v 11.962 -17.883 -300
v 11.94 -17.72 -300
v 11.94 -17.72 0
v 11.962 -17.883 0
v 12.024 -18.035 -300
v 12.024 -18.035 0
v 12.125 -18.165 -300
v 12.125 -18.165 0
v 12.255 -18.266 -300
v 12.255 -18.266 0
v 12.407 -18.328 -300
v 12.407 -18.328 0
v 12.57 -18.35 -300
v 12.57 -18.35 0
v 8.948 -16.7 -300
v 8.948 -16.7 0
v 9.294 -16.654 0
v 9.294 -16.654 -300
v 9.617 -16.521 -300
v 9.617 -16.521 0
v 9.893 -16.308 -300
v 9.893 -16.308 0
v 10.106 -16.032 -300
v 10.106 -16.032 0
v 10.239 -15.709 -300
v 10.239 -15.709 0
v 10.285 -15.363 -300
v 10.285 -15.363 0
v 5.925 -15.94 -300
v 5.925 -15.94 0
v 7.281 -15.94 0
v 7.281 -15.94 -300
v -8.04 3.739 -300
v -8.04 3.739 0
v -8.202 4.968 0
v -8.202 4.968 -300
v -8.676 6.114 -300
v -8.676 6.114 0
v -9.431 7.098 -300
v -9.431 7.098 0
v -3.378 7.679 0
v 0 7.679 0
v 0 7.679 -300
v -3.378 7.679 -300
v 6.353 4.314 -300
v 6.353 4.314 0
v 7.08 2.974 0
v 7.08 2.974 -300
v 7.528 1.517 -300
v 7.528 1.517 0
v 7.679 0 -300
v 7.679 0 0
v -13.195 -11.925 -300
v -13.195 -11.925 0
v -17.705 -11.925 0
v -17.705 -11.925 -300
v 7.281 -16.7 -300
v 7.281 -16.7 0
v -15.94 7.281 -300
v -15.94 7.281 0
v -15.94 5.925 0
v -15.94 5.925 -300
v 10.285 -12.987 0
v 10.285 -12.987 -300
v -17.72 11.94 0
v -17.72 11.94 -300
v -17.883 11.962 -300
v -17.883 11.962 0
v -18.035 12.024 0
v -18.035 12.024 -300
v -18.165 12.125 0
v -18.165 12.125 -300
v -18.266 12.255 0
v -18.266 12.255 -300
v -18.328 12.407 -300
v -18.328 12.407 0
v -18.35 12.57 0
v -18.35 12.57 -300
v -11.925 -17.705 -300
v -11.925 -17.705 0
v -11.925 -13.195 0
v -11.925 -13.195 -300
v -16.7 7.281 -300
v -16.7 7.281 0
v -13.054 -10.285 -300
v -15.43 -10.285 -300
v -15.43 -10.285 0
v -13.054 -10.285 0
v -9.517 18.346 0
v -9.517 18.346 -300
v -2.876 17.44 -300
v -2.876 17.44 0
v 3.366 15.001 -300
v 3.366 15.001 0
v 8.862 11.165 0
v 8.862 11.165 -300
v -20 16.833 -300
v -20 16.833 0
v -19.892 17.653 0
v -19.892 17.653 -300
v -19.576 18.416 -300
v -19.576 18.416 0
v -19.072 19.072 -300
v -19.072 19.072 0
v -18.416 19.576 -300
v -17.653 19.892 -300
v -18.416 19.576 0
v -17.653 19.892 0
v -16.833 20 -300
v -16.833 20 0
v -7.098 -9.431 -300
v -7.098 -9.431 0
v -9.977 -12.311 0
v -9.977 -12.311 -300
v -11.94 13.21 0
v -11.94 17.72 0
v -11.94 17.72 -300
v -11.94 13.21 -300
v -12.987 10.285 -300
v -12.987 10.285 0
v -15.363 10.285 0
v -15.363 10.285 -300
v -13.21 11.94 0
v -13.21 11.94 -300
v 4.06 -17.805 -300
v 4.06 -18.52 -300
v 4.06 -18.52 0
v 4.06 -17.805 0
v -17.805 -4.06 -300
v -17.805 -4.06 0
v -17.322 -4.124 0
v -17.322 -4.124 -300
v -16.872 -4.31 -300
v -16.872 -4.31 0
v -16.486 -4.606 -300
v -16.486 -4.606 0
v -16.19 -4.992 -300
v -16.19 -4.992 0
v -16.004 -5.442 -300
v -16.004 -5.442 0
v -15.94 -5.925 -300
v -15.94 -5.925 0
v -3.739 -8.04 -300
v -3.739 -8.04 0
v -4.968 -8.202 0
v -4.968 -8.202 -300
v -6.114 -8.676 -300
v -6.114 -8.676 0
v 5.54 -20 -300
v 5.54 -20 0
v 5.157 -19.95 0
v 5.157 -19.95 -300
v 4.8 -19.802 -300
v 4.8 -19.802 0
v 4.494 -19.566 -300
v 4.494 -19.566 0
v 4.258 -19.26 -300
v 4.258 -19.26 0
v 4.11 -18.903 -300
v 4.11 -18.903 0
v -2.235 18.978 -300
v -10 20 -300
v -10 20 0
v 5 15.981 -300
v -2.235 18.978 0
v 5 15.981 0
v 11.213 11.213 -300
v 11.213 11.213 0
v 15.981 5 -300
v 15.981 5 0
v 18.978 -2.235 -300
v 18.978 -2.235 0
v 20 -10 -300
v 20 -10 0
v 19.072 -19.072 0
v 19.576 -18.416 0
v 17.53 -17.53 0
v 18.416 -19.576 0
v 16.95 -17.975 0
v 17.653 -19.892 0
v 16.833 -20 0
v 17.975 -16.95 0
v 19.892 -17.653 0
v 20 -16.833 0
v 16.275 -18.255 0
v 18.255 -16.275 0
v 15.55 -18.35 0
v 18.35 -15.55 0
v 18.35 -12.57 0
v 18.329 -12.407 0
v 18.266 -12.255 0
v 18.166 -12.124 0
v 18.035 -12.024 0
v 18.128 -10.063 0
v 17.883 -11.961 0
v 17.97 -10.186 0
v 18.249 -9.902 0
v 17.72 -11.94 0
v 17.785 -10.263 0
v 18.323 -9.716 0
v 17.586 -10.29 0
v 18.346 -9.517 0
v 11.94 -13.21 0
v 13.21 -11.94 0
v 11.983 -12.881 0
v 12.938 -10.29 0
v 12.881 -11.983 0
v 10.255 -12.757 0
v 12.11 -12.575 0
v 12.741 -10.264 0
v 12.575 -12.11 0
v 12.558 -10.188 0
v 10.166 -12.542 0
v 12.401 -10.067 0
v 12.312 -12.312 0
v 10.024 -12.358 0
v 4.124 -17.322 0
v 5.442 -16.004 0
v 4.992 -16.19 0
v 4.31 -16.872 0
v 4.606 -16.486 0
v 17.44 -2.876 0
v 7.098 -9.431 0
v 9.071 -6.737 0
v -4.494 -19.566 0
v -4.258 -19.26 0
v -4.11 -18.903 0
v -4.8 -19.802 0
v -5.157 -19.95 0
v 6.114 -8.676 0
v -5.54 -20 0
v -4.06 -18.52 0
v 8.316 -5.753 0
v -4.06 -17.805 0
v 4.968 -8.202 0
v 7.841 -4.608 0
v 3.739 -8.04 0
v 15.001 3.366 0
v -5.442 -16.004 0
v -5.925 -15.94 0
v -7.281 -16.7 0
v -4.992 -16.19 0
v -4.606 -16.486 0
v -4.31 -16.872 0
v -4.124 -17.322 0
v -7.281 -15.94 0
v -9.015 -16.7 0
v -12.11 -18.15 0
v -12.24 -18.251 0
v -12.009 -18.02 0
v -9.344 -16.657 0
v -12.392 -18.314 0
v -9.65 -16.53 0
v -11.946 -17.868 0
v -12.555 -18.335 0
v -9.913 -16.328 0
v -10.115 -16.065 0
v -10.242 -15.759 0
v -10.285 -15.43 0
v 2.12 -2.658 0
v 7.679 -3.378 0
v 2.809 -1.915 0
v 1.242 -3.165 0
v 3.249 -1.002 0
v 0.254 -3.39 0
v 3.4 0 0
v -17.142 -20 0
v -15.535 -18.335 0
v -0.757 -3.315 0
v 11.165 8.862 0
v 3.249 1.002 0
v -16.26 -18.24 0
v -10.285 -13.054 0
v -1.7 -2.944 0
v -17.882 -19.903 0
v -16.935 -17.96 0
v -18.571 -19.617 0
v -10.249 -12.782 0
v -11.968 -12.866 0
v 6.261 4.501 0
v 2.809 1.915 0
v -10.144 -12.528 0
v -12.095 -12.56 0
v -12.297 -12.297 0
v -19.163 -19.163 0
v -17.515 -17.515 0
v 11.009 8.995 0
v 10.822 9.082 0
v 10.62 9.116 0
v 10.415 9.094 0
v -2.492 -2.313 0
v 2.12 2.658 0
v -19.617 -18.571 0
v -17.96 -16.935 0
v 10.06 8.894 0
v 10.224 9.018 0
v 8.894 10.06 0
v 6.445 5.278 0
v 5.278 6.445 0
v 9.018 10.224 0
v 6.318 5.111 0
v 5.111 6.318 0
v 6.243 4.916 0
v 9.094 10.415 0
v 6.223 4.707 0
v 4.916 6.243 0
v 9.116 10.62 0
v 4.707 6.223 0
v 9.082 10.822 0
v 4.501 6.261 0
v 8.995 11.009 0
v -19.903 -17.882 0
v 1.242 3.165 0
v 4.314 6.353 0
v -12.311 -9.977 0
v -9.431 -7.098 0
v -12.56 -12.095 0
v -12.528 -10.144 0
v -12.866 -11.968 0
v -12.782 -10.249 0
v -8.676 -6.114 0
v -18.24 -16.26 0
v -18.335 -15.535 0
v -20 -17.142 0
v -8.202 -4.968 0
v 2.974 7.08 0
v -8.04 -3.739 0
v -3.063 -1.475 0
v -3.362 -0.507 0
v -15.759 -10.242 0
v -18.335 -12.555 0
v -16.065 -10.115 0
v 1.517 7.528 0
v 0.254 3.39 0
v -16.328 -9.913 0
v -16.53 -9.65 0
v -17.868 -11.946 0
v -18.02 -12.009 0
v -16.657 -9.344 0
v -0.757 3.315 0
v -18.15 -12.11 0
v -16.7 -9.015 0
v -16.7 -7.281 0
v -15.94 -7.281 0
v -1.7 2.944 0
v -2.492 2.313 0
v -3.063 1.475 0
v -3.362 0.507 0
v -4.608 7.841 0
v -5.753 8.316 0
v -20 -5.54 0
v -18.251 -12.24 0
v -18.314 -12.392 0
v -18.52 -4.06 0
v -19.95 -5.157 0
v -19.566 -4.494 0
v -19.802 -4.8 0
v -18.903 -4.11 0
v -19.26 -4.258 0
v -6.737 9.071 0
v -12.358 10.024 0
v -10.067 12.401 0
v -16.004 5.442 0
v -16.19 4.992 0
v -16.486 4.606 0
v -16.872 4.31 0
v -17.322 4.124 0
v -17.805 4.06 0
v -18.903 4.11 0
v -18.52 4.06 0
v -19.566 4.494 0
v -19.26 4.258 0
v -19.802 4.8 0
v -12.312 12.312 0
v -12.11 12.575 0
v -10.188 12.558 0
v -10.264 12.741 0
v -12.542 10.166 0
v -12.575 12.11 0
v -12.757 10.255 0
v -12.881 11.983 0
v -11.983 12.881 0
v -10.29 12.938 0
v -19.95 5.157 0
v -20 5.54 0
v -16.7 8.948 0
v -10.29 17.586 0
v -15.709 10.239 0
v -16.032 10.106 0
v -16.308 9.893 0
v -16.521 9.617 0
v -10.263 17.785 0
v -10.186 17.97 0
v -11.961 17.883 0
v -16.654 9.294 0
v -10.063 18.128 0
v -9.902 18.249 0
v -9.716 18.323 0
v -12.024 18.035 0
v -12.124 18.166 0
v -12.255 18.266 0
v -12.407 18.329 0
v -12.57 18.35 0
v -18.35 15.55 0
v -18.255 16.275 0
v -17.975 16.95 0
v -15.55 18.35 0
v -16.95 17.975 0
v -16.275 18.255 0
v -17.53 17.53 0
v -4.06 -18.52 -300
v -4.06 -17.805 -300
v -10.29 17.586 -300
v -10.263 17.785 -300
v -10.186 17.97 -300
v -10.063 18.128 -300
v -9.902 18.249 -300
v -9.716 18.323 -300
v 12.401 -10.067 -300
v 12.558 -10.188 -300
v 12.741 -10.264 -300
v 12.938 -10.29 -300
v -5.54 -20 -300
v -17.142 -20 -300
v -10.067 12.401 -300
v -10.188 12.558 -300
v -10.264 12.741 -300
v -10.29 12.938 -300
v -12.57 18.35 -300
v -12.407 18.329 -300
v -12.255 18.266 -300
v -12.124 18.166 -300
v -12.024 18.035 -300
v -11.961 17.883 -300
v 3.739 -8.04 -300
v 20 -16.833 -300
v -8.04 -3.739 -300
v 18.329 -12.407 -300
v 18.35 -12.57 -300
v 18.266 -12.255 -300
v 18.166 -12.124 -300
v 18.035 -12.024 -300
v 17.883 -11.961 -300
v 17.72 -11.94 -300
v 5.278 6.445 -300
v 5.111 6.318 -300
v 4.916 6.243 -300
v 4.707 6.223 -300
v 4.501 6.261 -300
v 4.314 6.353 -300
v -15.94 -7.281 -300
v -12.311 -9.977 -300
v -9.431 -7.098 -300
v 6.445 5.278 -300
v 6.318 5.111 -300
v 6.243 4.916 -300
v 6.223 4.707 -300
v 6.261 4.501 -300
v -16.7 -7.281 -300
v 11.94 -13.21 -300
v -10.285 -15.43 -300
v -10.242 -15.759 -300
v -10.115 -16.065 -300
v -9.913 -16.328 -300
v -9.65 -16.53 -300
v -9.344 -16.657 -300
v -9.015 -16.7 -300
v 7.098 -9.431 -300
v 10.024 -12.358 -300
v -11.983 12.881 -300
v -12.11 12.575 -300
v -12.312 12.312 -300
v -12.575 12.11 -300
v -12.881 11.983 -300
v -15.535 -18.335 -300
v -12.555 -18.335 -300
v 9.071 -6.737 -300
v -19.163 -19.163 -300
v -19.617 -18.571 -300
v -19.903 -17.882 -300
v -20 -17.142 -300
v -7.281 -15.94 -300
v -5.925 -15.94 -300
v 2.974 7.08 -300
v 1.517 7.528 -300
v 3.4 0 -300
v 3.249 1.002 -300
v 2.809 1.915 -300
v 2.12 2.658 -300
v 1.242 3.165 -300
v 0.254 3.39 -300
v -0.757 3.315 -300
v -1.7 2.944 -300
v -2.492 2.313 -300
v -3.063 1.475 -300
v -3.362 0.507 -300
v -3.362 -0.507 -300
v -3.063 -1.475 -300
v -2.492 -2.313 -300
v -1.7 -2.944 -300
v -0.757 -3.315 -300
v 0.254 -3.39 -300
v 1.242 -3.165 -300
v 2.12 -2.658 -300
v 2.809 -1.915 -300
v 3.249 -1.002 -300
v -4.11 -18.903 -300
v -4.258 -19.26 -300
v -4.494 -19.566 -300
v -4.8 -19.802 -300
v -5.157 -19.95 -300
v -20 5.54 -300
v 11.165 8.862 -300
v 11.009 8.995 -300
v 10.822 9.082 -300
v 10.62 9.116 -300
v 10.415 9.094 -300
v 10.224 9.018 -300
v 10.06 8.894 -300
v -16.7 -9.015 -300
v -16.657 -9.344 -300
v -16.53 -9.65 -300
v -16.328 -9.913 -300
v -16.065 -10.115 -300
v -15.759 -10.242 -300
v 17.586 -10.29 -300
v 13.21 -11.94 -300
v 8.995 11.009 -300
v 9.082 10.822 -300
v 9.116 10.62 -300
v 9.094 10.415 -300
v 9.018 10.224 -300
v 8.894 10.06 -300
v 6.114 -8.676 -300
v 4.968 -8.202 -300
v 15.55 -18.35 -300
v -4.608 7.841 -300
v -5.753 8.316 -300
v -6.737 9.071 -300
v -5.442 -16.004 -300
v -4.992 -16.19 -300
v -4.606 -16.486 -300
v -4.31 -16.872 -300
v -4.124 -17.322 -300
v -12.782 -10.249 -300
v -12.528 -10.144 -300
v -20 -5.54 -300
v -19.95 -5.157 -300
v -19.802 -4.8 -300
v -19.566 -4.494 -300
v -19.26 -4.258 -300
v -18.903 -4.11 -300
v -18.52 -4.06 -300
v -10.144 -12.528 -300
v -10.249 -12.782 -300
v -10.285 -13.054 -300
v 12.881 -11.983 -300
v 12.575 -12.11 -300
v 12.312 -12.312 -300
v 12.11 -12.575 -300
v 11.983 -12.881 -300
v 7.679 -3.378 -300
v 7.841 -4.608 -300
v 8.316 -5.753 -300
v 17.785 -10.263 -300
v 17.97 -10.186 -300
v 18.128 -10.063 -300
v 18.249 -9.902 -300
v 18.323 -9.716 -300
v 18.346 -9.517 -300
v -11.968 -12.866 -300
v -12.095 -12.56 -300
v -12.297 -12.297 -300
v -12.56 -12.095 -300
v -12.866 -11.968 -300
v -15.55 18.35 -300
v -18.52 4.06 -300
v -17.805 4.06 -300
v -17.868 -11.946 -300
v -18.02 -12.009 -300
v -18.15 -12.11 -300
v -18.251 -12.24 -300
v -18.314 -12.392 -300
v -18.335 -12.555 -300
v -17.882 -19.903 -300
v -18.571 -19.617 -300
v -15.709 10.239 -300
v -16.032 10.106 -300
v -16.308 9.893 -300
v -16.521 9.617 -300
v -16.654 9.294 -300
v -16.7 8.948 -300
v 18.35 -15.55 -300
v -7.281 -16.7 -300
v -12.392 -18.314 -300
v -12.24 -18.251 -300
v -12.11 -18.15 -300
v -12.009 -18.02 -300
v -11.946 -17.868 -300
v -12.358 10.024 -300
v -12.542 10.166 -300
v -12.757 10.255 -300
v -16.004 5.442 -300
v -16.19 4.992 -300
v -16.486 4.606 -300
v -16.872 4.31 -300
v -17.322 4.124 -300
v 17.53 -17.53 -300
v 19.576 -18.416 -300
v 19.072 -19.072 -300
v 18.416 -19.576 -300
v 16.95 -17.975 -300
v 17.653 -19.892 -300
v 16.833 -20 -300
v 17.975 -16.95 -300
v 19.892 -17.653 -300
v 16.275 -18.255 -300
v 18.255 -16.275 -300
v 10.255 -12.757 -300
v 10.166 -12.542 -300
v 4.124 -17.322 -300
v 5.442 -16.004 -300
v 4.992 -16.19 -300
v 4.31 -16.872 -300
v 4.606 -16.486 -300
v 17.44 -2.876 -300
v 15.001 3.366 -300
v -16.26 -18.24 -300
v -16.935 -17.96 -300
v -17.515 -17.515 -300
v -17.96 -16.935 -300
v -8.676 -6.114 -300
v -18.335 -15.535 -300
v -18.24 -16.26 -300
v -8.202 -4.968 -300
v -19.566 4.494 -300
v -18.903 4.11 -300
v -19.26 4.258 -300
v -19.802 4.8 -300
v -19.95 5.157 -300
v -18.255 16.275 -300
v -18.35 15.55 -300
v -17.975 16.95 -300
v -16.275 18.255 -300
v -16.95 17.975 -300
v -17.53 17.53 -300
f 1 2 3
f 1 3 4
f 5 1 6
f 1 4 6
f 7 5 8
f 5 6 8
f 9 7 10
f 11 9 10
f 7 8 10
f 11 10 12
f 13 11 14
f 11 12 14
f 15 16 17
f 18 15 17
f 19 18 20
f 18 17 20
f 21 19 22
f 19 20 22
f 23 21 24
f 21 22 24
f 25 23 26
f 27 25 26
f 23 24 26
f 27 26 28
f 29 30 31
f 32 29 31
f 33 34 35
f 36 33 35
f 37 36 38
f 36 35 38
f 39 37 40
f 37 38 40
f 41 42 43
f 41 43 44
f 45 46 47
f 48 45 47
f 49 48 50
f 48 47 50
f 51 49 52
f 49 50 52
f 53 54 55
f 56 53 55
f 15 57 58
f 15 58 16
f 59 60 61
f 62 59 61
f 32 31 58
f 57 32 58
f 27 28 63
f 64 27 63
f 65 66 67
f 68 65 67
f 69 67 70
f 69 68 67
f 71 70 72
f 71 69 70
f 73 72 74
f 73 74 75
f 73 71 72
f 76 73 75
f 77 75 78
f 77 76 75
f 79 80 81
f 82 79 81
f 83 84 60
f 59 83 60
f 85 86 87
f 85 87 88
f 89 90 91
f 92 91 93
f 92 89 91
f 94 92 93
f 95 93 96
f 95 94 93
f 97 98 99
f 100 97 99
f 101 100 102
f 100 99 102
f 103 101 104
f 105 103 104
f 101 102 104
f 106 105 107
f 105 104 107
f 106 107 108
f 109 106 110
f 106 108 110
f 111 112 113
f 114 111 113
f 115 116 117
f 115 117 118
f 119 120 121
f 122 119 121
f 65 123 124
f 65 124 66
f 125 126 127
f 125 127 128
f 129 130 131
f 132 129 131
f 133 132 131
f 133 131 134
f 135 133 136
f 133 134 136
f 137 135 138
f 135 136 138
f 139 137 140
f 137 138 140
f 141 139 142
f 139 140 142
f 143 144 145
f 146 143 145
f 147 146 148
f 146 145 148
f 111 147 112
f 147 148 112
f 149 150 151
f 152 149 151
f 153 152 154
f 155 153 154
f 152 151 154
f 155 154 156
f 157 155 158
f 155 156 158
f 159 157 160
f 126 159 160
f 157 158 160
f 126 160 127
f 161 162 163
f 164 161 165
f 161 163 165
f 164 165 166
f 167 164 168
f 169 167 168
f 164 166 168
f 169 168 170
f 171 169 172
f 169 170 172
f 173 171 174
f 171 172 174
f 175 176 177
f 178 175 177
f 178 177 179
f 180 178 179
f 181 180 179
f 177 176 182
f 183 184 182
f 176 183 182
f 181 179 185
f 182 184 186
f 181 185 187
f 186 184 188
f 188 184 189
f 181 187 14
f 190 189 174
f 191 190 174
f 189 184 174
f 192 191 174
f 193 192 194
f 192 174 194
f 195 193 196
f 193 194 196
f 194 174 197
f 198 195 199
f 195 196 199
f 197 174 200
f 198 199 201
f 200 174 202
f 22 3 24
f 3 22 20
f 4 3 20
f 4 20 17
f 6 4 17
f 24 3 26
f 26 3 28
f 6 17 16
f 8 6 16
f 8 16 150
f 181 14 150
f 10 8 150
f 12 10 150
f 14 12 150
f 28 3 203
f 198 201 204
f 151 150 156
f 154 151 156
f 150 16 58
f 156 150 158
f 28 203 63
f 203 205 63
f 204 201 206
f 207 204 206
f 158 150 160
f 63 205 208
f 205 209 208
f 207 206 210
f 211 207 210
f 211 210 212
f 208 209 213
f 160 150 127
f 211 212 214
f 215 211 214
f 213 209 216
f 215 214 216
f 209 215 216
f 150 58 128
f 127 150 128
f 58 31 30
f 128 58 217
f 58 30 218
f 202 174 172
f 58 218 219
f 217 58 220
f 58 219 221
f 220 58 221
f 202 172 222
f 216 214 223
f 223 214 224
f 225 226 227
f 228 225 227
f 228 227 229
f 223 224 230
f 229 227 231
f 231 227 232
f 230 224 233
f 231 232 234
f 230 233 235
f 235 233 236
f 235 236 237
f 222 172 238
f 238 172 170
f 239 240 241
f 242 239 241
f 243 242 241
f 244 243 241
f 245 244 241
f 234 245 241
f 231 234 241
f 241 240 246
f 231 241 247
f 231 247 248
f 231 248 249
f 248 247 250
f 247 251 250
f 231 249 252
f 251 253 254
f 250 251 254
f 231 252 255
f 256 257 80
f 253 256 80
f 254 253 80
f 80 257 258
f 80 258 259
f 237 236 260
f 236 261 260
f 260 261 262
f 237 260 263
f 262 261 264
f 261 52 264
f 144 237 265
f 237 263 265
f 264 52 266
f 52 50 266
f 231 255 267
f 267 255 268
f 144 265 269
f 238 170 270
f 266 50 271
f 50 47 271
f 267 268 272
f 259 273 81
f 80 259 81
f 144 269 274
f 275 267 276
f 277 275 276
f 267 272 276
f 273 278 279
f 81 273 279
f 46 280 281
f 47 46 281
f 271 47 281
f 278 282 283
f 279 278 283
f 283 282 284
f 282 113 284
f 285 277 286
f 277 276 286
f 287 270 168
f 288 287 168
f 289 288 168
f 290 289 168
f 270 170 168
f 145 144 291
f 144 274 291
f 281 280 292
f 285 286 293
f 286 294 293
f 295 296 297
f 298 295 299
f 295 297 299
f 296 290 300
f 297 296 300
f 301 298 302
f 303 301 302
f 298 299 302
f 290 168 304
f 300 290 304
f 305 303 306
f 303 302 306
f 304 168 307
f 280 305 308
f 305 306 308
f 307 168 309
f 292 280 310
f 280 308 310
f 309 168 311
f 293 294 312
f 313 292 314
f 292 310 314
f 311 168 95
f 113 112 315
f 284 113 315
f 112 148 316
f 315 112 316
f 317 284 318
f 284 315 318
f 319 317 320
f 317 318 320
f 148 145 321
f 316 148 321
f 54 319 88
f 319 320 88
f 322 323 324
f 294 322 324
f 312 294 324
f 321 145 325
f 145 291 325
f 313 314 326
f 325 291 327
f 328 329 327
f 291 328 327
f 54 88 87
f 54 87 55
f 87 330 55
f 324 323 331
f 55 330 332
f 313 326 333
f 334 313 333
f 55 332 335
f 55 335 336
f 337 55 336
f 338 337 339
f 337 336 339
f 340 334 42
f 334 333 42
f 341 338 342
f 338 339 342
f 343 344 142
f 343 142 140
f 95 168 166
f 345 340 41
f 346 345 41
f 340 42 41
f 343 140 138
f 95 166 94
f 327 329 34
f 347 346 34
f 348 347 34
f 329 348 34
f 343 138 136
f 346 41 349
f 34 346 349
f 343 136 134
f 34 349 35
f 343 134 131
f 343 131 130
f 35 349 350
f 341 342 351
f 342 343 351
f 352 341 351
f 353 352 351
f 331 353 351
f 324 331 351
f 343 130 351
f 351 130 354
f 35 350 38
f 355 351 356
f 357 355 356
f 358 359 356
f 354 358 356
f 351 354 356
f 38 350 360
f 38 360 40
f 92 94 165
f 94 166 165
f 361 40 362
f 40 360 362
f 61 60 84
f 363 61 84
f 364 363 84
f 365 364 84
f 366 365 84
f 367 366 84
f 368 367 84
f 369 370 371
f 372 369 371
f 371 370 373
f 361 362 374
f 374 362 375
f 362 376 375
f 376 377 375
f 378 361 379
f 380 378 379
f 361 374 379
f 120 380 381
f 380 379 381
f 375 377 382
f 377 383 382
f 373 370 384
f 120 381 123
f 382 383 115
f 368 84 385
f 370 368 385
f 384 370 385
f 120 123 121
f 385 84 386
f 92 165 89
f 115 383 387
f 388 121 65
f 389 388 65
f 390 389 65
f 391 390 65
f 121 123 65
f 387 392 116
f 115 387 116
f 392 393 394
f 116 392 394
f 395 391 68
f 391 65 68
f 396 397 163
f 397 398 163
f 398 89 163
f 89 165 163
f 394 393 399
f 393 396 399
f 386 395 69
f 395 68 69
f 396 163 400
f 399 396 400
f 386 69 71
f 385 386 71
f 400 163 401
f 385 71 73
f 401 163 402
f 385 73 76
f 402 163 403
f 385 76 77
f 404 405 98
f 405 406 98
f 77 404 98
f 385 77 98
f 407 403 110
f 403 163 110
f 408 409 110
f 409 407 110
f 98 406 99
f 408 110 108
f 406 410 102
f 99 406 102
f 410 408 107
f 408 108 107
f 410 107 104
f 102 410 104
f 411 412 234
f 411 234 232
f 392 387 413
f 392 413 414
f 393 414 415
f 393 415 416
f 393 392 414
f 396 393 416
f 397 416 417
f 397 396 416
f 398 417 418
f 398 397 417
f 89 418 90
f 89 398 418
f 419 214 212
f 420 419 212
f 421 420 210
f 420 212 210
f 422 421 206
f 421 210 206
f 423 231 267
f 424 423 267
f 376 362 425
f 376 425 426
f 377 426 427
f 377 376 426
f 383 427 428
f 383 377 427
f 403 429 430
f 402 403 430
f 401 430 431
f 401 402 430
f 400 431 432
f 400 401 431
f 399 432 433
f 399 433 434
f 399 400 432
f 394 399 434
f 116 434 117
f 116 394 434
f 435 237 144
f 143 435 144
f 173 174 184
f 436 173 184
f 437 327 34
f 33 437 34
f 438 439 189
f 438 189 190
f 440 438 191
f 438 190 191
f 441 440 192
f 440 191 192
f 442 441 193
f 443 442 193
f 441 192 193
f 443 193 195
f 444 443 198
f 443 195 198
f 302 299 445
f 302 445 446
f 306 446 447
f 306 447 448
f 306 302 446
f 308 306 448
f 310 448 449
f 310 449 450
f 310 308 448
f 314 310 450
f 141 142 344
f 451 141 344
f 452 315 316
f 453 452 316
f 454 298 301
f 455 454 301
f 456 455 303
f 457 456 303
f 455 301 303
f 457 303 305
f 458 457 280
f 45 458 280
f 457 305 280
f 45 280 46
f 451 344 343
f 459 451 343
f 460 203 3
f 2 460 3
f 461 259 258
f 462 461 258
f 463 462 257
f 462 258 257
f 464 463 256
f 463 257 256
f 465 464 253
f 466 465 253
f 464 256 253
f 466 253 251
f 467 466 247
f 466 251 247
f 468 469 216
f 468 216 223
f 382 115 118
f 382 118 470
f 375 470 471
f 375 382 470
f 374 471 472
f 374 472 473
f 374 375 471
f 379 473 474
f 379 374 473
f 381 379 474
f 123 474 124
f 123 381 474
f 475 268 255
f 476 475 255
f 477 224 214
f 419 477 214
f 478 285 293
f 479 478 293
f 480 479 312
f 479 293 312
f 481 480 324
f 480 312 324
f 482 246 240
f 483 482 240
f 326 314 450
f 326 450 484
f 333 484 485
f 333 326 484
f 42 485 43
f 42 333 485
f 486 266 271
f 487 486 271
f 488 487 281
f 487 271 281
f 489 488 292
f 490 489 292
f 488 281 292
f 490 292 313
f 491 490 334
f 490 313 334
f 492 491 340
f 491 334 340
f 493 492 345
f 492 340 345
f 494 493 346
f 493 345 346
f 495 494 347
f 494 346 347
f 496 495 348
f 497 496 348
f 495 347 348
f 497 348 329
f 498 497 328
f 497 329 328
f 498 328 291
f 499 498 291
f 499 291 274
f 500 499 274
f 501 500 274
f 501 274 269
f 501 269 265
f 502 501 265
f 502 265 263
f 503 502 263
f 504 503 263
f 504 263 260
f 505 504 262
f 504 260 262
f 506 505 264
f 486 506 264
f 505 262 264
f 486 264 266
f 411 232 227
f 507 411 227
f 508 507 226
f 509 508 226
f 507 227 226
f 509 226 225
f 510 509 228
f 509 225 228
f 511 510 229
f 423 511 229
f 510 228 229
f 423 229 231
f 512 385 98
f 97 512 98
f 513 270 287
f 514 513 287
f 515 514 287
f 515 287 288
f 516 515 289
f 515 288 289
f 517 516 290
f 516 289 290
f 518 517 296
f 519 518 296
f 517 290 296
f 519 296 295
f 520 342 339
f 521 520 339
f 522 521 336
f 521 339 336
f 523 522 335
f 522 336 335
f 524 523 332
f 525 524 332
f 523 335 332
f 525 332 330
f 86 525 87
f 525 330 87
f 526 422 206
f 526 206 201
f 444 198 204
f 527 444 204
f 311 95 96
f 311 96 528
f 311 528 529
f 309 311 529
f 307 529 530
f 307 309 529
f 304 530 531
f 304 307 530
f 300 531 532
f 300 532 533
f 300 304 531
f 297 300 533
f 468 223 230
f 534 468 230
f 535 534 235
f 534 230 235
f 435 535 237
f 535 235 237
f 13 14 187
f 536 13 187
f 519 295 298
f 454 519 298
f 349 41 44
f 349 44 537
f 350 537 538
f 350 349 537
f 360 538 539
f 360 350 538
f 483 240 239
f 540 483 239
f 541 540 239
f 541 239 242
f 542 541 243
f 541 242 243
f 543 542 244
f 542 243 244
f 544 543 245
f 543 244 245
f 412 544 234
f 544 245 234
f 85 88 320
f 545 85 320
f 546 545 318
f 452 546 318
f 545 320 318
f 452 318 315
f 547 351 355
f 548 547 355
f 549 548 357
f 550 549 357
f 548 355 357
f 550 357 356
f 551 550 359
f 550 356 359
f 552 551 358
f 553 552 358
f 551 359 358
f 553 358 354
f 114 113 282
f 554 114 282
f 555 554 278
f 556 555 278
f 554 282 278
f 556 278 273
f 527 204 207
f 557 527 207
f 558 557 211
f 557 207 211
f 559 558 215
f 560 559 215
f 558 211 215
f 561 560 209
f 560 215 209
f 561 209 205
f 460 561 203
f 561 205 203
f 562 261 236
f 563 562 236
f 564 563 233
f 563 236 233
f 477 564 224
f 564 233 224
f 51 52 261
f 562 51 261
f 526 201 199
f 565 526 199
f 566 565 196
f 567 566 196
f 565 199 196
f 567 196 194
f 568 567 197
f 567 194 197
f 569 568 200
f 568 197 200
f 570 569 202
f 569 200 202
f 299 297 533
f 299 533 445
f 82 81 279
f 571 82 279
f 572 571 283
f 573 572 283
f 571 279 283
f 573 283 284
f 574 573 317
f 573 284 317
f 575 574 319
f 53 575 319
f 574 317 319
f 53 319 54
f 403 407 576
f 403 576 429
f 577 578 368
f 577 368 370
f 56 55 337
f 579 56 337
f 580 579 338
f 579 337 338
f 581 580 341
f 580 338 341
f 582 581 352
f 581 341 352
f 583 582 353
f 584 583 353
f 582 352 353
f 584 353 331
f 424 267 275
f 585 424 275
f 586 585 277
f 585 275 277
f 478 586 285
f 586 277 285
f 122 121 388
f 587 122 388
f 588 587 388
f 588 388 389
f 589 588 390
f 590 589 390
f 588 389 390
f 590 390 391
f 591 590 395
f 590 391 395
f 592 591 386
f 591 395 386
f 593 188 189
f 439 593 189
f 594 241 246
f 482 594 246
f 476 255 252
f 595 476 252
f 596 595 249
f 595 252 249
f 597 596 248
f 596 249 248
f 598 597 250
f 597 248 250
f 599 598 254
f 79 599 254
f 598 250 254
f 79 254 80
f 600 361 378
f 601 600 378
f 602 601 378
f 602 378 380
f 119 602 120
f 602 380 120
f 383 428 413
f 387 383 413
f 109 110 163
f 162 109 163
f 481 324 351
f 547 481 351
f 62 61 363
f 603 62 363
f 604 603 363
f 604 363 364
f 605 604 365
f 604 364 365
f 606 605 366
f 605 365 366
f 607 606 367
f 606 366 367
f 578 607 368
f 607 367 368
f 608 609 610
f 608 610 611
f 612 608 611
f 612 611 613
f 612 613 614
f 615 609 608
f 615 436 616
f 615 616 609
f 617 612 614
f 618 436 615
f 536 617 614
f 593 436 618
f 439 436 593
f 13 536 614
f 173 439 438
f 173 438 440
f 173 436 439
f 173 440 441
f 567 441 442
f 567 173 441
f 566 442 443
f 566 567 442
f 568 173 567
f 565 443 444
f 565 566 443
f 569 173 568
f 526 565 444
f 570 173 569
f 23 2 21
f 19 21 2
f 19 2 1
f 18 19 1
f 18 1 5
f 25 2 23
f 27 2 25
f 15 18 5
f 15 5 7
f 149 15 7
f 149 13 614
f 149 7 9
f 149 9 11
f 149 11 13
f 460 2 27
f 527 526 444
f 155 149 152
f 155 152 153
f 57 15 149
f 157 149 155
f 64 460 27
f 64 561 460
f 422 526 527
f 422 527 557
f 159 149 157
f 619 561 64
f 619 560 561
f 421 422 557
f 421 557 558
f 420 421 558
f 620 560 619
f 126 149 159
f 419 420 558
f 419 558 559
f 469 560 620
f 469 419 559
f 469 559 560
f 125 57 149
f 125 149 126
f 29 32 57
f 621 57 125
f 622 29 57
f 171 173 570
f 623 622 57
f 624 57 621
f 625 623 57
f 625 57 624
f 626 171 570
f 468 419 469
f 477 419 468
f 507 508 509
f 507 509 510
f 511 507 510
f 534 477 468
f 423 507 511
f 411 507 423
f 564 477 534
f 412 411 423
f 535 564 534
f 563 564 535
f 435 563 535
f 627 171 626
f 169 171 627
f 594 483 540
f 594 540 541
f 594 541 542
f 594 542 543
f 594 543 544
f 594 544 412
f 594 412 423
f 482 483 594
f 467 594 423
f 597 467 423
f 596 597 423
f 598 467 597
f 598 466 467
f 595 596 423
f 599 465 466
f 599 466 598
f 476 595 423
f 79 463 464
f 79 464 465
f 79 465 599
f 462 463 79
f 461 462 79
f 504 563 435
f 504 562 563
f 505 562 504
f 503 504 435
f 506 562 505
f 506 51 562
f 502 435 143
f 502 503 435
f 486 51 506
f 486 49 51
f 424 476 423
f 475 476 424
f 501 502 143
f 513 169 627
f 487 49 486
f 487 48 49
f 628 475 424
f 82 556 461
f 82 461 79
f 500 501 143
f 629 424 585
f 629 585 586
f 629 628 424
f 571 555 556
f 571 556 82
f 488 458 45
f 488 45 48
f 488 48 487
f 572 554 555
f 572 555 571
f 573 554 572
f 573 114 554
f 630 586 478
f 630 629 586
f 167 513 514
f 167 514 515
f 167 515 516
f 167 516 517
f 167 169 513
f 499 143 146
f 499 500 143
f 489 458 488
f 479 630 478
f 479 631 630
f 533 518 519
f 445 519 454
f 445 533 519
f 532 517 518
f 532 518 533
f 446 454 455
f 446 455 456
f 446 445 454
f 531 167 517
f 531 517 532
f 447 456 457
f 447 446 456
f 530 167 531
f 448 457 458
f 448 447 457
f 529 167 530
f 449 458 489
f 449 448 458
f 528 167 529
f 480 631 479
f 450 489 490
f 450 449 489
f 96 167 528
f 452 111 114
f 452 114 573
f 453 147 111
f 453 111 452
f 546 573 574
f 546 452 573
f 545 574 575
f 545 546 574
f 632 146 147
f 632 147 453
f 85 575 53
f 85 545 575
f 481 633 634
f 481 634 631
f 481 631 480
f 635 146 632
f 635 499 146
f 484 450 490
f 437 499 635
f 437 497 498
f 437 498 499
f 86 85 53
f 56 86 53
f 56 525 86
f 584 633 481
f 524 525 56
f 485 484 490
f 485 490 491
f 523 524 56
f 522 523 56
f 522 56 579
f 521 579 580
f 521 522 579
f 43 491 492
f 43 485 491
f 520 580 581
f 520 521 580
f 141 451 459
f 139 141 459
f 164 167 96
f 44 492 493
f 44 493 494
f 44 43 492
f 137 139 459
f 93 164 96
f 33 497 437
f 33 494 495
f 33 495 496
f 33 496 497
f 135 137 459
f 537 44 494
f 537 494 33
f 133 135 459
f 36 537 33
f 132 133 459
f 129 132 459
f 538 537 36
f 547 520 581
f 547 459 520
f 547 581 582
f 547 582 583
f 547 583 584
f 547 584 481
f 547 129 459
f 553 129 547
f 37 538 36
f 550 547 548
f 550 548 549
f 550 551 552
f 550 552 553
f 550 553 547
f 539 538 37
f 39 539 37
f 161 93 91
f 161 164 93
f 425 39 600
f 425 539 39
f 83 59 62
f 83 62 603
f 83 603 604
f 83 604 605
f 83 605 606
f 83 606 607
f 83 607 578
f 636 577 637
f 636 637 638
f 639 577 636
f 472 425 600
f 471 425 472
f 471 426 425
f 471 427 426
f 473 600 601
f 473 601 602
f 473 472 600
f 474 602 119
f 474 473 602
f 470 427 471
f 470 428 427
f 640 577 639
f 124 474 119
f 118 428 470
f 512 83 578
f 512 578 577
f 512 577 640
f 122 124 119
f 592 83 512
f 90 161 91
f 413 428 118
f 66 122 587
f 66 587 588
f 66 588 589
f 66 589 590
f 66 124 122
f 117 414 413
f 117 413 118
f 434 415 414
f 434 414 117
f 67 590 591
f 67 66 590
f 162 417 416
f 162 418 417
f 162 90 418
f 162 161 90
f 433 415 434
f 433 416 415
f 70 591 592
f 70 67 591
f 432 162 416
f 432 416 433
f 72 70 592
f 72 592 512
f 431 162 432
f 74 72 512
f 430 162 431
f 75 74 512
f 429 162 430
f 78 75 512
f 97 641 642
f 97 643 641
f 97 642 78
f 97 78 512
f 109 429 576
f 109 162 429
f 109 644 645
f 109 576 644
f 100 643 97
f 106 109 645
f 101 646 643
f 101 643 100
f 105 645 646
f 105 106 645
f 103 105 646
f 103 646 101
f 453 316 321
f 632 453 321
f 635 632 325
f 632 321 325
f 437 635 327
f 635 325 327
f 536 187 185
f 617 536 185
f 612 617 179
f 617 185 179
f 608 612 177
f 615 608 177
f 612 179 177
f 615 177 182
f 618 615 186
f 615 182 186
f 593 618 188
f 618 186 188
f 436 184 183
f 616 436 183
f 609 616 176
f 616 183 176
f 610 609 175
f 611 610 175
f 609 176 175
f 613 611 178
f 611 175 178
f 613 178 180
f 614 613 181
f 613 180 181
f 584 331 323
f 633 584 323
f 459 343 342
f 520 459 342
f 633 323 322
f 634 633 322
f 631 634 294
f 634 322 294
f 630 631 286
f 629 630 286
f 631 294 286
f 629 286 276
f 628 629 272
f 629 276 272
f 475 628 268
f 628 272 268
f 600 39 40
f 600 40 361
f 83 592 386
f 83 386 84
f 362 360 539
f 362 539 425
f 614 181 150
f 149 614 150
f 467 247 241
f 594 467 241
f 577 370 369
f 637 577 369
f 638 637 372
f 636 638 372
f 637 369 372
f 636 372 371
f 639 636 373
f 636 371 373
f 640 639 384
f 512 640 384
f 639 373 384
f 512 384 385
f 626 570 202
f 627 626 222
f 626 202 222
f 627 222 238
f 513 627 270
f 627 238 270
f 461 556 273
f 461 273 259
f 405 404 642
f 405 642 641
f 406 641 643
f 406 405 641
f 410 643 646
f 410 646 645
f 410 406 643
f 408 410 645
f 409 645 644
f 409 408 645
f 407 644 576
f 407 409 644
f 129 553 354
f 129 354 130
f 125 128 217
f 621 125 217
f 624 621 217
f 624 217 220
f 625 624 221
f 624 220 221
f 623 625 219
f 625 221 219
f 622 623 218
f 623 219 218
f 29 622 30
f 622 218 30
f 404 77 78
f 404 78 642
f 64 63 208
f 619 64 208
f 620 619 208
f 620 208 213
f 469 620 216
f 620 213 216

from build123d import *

# Parameters (mm, degrees)
SKETCH1_R      = 3.4
EXTRUDE1_DEPTH = 300


with BuildPart() as part:
    # Sketch1 → Extrude1 (new body)
    with BuildSketch(Plane.XY):
        with BuildLine():
            Line((-13.552721419, -20), (-17.142397126, -20))
            ThreePointArc((-17.142397126, -20), (-18.235954402, -19.782477933), (-19.163027496, -19.163027496))
            ThreePointArc((-19.163027496, -19.163027496), (-19.782477933, -18.235954402), (-20, -17.142397126))
            Line((-20, -17.142397126), (-20, -13.552721419))
            Line((-20, -13.552721419), (-20, -5.540330257))
            ThreePointArc((-20, -5.540330257), (-19.566421306, -4.493578694), (-18.519669743, -4.06))
            Line((-18.519669743, -4.06), (-17.804849126, -4.06))
            ThreePointArc((-17.804849126, -4.06), (-16.486201663, -4.606201663), (-15.94, -5.924849126))
            Line((-15.94, -5.924849126), (-15.94, -7.280726922))
            Line((-15.94, -7.280726922), (-16.7, -7.280726922))
            Line((-16.7, -7.280726922), (-16.7, -9.015))
            ThreePointArc((-16.7, -9.015), (-16.328025612, -9.913025612), (-15.43, -10.285))
            Line((-15.43, -10.285), (-13.053775012, -10.285))
            ThreePointArc((-13.053775012, -10.285), (-12.65158934, -10.205000296), (-12.310632791, -9.977180413))
            Line((-12.310632791, -9.977180413), (-9.431242789, -7.097790411))
            ThreePointArc((-9.431242789, -7.097790411), (-8.401572221, -5.556779505), (-8.04, -3.739033201))
            Line((-8.04, -3.739033201), (-8.04, 3.739033201))
            ThreePointArc((-8.04, 3.739033201), (-8.401572221, 5.556779505), (-9.431242789, 7.097790411))
            Line((-9.431242789, 7.097790411), (-12.357777413, 10.024325035))
            ThreePointArc((-12.357777413, 10.024325035), (-12.646514194, 10.217252784), (-12.987102448, 10.285))
            Line((-12.987102448, 10.285), (-15.363327437, 10.285))
            ThreePointArc((-15.363327437, 10.285), (-16.30849767, 9.89349767), (-16.7, 8.948327437))
            Line((-16.7, 8.948327437), (-16.7, 7.280726922))
            Line((-16.7, 7.280726922), (-15.94, 7.280726922))
            Line((-15.94, 7.280726922), (-15.94, 5.924849126))
            ThreePointArc((-15.94, 5.924849126), (-16.486201663, 4.606201663), (-17.804849126, 4.06))
            Line((-17.804849126, 4.06), (-18.519669743, 4.06))
            ThreePointArc((-18.519669743, 4.06), (-19.566421306, 4.493578694), (-20, 5.540330257))
            Line((-20, 5.540330257), (-20, 12.563650804))
            Line((-20, 12.563650804), (-20, 16.832984559))
            ThreePointArc((-20, 16.832984559), (-19.072402654, 19.072402654), (-16.832984559, 20))
            Line((-16.832984559, 20), (-10, 20))
            ThreePointArc((-10, 20), (11.213203436, 11.213203436), (20, -10))
            Line((20, -10), (20, -16.832984559))
            ThreePointArc((20, -16.832984559), (19.072402654, -19.072402654), (16.832984559, -20))
            Line((16.832984559, -20), (12.563650804, -20))
            Line((12.563650804, -20), (5.540330257, -20))
            ThreePointArc((5.540330257, -20), (4.493578694, -19.566421306), (4.06, -18.519669743))
            Line((4.06, -18.519669743), (4.06, -17.804849126))
            ThreePointArc((4.06, -17.804849126), (4.606201663, -16.486201663), (5.924849126, -15.94))
            Line((5.924849126, -15.94), (7.280726922, -15.94))
            Line((7.280726922, -15.94), (7.280726922, -16.7))
            Line((7.280726922, -16.7), (8.948327437, -16.7))
            ThreePointArc((8.948327437, -16.7), (9.89349767, -16.30849767), (10.285, -15.363327437))
            Line((10.285, -15.363327437), (10.285, -12.987102448))
            ThreePointArc((10.285, -12.987102448), (10.217252784, -12.646514194), (10.024325035, -12.357777413))
            Line((10.024325035, -12.357777413), (7.097790411, -9.431242789))
            ThreePointArc((7.097790411, -9.431242789), (5.556779505, -8.401572221), (3.739033201, -8.04))
            Line((3.739033201, -8.04), (-3.739033201, -8.04))
            ThreePointArc((-3.739033201, -8.04), (-5.556779505, -8.401572221), (-7.097790411, -9.431242789))
            Line((-7.097790411, -9.431242789), (-9.977180413, -12.310632791))
            ThreePointArc((-9.977180413, -12.310632791), (-10.205000296, -12.65158934), (-10.285, -13.053775012))
            Line((-10.285, -13.053775012), (-10.285, -15.43))
            ThreePointArc((-10.285, -15.43), (-9.913025612, -16.328025612), (-9.015, -16.7))
            Line((-9.015, -16.7), (-7.280726922, -16.7))
            Line((-7.280726922, -16.7), (-7.280726922, -15.94))
            Line((-7.280726922, -15.94), (-5.924849126, -15.94))
            ThreePointArc((-5.924849126, -15.94), (-4.606201663, -16.486201663), (-4.06, -17.804849126))
            Line((-4.06, -17.804849126), (-4.06, -18.519669743))
            ThreePointArc((-4.06, -18.519669743), (-4.493578694, -19.566421306), (-5.540330257, -20))
            Line((-5.540330257, -20), (-13.552721419, -20))
        make_face()
        Circle(SKETCH1_R, mode=Mode.SUBTRACT)
        with BuildLine():
            Line((-11.925, -17.705), (-11.925, -13.195))
            ThreePointArc((-11.925, -13.195), (-12.296974388, -12.296974388), (-13.195, -11.925))
            Line((-13.195, -11.925), (-17.705, -11.925))
            ThreePointArc((-17.705, -11.925), (-18.150477272, -12.109522728), (-18.335, -12.555))
            Line((-18.335, -12.555), (-18.335, -15.535))
            ThreePointArc((-18.335, -15.535), (-17.514898987, -17.514898987), (-15.535, -18.335))
            Line((-15.535, -18.335), (-12.555, -18.335))
            ThreePointArc((-12.555, -18.335), (-12.109522728, -18.150477272), (-11.925, -17.705))
        make_face(mode=Mode.SUBTRACT)
        with BuildLine():
            Line((7.679270597, 0), (7.679270597, -3.378303798))
            ThreePointArc((7.679270597, -3.378303798), (8.040842817, -5.196050101), (9.070513386, -6.737061008))
            Line((9.070513386, -6.737061008), (12.400776329, -10.067323951))
            ThreePointArc((12.400776329, -10.067323951), (12.647338074, -10.232071242), (12.938177482, -10.289922797))
            Line((12.938177482, -10.289922797), (17.586072346, -10.289922797))
            ThreePointArc((17.586072346, -10.289922797), (18.12803226, -10.062726187), (18.345962028, -9.516973987))
            ThreePointArc((18.345962028, -9.516973987), (16.406061612, 0.317305248), (11.165061741, 8.861787798))
            ThreePointArc((11.165061741, 8.861787798), (10.619514718, 9.11583304), (10.060274233, 8.893548045))
            Line((10.060274233, 8.893548045), (6.444636983, 5.277910795))
            ThreePointArc((6.444636983, 5.277910795), (6.225426758, 4.812198006), (6.353269463, 4.313602211))
            ThreePointArc((6.353269463, 4.313602211), (7.34028856, 2.256404387), (7.679270597, 0))
        make_face(mode=Mode.SUBTRACT)
        with BuildLine():
            Line((17.720077203, -11.939922797), (13.210077203, -11.939922797))
            ThreePointArc((13.210077203, -11.939922797), (12.312051591, -12.311897185), (11.940077203, -13.209922797))
            Line((11.940077203, -13.209922797), (11.940077203, -17.719922797))
            ThreePointArc((11.940077203, -17.719922797), (12.124599931, -18.165400069), (12.570077203, -18.349922797))
            Line((12.570077203, -18.349922797), (15.550077203, -18.349922797))
            ThreePointArc((15.550077203, -18.349922797), (17.52997619, -17.529821784), (18.350077203, -15.549922797))
            Line((18.350077203, -15.549922797), (18.350077203, -12.569922797))
            ThreePointArc((18.350077203, -12.569922797), (18.165554475, -12.124445525), (17.720077203, -11.939922797))
        make_face(mode=Mode.SUBTRACT)
        with BuildLine():
            Line((-13.209922797, 11.940077203), (-17.719922797, 11.940077203))
            ThreePointArc((-17.719922797, 11.940077203), (-18.165400069, 12.124599931), (-18.349922797, 12.570077203))
            Line((-18.349922797, 12.570077203), (-18.349922797, 15.550077203))
            ThreePointArc((-18.349922797, 15.550077203), (-17.529821784, 17.52997619), (-15.549922797, 18.350077203))
            Line((-15.549922797, 18.350077203), (-12.569922797, 18.350077203))
            ThreePointArc((-12.569922797, 18.350077203), (-12.124445525, 18.165554475), (-11.939922797, 17.720077203))
            Line((-11.939922797, 17.720077203), (-11.939922797, 13.210077203))
            ThreePointArc((-11.939922797, 13.210077203), (-12.311897185, 12.312051591), (-13.209922797, 11.940077203))
        make_face(mode=Mode.SUBTRACT)
        with BuildLine():
            Line((8.893548045, 10.060274233), (5.277910795, 6.444636983))
            ThreePointArc((5.277910795, 6.444636983), (4.812198006, 6.225426758), (4.313602211, 6.353269463))
            ThreePointArc((4.313602211, 6.353269463), (2.256404387, 7.34028856), (0, 7.679270597))
            Line((0, 7.679270597), (-3.378303798, 7.679270597))
            ThreePointArc((-3.378303798, 7.679270597), (-5.196050101, 8.040842817), (-6.737061008, 9.070513386))
            Line((-6.737061008, 9.070513386), (-10.067323951, 12.400776329))
            ThreePointArc((-10.067323951, 12.400776329), (-10.232071242, 12.647338074), (-10.289922797, 12.938177482))
            Line((-10.289922797, 12.938177482), (-10.289922797, 17.586072346))
            ThreePointArc((-10.289922797, 17.586072346), (-10.062726187, 18.12803226), (-9.516973987, 18.345962028))
            ThreePointArc((-9.516973987, 18.345962028), (0.317305248, 16.406061612), (8.861787798, 11.165061741))
            ThreePointArc((8.861787798, 11.165061741), (9.11583304, 10.619514718), (8.893548045, 10.060274233))
        make_face(mode=Mode.SUBTRACT)
    extrude(amount=-EXTRUDE1_DEPTH)


solid = part.part
